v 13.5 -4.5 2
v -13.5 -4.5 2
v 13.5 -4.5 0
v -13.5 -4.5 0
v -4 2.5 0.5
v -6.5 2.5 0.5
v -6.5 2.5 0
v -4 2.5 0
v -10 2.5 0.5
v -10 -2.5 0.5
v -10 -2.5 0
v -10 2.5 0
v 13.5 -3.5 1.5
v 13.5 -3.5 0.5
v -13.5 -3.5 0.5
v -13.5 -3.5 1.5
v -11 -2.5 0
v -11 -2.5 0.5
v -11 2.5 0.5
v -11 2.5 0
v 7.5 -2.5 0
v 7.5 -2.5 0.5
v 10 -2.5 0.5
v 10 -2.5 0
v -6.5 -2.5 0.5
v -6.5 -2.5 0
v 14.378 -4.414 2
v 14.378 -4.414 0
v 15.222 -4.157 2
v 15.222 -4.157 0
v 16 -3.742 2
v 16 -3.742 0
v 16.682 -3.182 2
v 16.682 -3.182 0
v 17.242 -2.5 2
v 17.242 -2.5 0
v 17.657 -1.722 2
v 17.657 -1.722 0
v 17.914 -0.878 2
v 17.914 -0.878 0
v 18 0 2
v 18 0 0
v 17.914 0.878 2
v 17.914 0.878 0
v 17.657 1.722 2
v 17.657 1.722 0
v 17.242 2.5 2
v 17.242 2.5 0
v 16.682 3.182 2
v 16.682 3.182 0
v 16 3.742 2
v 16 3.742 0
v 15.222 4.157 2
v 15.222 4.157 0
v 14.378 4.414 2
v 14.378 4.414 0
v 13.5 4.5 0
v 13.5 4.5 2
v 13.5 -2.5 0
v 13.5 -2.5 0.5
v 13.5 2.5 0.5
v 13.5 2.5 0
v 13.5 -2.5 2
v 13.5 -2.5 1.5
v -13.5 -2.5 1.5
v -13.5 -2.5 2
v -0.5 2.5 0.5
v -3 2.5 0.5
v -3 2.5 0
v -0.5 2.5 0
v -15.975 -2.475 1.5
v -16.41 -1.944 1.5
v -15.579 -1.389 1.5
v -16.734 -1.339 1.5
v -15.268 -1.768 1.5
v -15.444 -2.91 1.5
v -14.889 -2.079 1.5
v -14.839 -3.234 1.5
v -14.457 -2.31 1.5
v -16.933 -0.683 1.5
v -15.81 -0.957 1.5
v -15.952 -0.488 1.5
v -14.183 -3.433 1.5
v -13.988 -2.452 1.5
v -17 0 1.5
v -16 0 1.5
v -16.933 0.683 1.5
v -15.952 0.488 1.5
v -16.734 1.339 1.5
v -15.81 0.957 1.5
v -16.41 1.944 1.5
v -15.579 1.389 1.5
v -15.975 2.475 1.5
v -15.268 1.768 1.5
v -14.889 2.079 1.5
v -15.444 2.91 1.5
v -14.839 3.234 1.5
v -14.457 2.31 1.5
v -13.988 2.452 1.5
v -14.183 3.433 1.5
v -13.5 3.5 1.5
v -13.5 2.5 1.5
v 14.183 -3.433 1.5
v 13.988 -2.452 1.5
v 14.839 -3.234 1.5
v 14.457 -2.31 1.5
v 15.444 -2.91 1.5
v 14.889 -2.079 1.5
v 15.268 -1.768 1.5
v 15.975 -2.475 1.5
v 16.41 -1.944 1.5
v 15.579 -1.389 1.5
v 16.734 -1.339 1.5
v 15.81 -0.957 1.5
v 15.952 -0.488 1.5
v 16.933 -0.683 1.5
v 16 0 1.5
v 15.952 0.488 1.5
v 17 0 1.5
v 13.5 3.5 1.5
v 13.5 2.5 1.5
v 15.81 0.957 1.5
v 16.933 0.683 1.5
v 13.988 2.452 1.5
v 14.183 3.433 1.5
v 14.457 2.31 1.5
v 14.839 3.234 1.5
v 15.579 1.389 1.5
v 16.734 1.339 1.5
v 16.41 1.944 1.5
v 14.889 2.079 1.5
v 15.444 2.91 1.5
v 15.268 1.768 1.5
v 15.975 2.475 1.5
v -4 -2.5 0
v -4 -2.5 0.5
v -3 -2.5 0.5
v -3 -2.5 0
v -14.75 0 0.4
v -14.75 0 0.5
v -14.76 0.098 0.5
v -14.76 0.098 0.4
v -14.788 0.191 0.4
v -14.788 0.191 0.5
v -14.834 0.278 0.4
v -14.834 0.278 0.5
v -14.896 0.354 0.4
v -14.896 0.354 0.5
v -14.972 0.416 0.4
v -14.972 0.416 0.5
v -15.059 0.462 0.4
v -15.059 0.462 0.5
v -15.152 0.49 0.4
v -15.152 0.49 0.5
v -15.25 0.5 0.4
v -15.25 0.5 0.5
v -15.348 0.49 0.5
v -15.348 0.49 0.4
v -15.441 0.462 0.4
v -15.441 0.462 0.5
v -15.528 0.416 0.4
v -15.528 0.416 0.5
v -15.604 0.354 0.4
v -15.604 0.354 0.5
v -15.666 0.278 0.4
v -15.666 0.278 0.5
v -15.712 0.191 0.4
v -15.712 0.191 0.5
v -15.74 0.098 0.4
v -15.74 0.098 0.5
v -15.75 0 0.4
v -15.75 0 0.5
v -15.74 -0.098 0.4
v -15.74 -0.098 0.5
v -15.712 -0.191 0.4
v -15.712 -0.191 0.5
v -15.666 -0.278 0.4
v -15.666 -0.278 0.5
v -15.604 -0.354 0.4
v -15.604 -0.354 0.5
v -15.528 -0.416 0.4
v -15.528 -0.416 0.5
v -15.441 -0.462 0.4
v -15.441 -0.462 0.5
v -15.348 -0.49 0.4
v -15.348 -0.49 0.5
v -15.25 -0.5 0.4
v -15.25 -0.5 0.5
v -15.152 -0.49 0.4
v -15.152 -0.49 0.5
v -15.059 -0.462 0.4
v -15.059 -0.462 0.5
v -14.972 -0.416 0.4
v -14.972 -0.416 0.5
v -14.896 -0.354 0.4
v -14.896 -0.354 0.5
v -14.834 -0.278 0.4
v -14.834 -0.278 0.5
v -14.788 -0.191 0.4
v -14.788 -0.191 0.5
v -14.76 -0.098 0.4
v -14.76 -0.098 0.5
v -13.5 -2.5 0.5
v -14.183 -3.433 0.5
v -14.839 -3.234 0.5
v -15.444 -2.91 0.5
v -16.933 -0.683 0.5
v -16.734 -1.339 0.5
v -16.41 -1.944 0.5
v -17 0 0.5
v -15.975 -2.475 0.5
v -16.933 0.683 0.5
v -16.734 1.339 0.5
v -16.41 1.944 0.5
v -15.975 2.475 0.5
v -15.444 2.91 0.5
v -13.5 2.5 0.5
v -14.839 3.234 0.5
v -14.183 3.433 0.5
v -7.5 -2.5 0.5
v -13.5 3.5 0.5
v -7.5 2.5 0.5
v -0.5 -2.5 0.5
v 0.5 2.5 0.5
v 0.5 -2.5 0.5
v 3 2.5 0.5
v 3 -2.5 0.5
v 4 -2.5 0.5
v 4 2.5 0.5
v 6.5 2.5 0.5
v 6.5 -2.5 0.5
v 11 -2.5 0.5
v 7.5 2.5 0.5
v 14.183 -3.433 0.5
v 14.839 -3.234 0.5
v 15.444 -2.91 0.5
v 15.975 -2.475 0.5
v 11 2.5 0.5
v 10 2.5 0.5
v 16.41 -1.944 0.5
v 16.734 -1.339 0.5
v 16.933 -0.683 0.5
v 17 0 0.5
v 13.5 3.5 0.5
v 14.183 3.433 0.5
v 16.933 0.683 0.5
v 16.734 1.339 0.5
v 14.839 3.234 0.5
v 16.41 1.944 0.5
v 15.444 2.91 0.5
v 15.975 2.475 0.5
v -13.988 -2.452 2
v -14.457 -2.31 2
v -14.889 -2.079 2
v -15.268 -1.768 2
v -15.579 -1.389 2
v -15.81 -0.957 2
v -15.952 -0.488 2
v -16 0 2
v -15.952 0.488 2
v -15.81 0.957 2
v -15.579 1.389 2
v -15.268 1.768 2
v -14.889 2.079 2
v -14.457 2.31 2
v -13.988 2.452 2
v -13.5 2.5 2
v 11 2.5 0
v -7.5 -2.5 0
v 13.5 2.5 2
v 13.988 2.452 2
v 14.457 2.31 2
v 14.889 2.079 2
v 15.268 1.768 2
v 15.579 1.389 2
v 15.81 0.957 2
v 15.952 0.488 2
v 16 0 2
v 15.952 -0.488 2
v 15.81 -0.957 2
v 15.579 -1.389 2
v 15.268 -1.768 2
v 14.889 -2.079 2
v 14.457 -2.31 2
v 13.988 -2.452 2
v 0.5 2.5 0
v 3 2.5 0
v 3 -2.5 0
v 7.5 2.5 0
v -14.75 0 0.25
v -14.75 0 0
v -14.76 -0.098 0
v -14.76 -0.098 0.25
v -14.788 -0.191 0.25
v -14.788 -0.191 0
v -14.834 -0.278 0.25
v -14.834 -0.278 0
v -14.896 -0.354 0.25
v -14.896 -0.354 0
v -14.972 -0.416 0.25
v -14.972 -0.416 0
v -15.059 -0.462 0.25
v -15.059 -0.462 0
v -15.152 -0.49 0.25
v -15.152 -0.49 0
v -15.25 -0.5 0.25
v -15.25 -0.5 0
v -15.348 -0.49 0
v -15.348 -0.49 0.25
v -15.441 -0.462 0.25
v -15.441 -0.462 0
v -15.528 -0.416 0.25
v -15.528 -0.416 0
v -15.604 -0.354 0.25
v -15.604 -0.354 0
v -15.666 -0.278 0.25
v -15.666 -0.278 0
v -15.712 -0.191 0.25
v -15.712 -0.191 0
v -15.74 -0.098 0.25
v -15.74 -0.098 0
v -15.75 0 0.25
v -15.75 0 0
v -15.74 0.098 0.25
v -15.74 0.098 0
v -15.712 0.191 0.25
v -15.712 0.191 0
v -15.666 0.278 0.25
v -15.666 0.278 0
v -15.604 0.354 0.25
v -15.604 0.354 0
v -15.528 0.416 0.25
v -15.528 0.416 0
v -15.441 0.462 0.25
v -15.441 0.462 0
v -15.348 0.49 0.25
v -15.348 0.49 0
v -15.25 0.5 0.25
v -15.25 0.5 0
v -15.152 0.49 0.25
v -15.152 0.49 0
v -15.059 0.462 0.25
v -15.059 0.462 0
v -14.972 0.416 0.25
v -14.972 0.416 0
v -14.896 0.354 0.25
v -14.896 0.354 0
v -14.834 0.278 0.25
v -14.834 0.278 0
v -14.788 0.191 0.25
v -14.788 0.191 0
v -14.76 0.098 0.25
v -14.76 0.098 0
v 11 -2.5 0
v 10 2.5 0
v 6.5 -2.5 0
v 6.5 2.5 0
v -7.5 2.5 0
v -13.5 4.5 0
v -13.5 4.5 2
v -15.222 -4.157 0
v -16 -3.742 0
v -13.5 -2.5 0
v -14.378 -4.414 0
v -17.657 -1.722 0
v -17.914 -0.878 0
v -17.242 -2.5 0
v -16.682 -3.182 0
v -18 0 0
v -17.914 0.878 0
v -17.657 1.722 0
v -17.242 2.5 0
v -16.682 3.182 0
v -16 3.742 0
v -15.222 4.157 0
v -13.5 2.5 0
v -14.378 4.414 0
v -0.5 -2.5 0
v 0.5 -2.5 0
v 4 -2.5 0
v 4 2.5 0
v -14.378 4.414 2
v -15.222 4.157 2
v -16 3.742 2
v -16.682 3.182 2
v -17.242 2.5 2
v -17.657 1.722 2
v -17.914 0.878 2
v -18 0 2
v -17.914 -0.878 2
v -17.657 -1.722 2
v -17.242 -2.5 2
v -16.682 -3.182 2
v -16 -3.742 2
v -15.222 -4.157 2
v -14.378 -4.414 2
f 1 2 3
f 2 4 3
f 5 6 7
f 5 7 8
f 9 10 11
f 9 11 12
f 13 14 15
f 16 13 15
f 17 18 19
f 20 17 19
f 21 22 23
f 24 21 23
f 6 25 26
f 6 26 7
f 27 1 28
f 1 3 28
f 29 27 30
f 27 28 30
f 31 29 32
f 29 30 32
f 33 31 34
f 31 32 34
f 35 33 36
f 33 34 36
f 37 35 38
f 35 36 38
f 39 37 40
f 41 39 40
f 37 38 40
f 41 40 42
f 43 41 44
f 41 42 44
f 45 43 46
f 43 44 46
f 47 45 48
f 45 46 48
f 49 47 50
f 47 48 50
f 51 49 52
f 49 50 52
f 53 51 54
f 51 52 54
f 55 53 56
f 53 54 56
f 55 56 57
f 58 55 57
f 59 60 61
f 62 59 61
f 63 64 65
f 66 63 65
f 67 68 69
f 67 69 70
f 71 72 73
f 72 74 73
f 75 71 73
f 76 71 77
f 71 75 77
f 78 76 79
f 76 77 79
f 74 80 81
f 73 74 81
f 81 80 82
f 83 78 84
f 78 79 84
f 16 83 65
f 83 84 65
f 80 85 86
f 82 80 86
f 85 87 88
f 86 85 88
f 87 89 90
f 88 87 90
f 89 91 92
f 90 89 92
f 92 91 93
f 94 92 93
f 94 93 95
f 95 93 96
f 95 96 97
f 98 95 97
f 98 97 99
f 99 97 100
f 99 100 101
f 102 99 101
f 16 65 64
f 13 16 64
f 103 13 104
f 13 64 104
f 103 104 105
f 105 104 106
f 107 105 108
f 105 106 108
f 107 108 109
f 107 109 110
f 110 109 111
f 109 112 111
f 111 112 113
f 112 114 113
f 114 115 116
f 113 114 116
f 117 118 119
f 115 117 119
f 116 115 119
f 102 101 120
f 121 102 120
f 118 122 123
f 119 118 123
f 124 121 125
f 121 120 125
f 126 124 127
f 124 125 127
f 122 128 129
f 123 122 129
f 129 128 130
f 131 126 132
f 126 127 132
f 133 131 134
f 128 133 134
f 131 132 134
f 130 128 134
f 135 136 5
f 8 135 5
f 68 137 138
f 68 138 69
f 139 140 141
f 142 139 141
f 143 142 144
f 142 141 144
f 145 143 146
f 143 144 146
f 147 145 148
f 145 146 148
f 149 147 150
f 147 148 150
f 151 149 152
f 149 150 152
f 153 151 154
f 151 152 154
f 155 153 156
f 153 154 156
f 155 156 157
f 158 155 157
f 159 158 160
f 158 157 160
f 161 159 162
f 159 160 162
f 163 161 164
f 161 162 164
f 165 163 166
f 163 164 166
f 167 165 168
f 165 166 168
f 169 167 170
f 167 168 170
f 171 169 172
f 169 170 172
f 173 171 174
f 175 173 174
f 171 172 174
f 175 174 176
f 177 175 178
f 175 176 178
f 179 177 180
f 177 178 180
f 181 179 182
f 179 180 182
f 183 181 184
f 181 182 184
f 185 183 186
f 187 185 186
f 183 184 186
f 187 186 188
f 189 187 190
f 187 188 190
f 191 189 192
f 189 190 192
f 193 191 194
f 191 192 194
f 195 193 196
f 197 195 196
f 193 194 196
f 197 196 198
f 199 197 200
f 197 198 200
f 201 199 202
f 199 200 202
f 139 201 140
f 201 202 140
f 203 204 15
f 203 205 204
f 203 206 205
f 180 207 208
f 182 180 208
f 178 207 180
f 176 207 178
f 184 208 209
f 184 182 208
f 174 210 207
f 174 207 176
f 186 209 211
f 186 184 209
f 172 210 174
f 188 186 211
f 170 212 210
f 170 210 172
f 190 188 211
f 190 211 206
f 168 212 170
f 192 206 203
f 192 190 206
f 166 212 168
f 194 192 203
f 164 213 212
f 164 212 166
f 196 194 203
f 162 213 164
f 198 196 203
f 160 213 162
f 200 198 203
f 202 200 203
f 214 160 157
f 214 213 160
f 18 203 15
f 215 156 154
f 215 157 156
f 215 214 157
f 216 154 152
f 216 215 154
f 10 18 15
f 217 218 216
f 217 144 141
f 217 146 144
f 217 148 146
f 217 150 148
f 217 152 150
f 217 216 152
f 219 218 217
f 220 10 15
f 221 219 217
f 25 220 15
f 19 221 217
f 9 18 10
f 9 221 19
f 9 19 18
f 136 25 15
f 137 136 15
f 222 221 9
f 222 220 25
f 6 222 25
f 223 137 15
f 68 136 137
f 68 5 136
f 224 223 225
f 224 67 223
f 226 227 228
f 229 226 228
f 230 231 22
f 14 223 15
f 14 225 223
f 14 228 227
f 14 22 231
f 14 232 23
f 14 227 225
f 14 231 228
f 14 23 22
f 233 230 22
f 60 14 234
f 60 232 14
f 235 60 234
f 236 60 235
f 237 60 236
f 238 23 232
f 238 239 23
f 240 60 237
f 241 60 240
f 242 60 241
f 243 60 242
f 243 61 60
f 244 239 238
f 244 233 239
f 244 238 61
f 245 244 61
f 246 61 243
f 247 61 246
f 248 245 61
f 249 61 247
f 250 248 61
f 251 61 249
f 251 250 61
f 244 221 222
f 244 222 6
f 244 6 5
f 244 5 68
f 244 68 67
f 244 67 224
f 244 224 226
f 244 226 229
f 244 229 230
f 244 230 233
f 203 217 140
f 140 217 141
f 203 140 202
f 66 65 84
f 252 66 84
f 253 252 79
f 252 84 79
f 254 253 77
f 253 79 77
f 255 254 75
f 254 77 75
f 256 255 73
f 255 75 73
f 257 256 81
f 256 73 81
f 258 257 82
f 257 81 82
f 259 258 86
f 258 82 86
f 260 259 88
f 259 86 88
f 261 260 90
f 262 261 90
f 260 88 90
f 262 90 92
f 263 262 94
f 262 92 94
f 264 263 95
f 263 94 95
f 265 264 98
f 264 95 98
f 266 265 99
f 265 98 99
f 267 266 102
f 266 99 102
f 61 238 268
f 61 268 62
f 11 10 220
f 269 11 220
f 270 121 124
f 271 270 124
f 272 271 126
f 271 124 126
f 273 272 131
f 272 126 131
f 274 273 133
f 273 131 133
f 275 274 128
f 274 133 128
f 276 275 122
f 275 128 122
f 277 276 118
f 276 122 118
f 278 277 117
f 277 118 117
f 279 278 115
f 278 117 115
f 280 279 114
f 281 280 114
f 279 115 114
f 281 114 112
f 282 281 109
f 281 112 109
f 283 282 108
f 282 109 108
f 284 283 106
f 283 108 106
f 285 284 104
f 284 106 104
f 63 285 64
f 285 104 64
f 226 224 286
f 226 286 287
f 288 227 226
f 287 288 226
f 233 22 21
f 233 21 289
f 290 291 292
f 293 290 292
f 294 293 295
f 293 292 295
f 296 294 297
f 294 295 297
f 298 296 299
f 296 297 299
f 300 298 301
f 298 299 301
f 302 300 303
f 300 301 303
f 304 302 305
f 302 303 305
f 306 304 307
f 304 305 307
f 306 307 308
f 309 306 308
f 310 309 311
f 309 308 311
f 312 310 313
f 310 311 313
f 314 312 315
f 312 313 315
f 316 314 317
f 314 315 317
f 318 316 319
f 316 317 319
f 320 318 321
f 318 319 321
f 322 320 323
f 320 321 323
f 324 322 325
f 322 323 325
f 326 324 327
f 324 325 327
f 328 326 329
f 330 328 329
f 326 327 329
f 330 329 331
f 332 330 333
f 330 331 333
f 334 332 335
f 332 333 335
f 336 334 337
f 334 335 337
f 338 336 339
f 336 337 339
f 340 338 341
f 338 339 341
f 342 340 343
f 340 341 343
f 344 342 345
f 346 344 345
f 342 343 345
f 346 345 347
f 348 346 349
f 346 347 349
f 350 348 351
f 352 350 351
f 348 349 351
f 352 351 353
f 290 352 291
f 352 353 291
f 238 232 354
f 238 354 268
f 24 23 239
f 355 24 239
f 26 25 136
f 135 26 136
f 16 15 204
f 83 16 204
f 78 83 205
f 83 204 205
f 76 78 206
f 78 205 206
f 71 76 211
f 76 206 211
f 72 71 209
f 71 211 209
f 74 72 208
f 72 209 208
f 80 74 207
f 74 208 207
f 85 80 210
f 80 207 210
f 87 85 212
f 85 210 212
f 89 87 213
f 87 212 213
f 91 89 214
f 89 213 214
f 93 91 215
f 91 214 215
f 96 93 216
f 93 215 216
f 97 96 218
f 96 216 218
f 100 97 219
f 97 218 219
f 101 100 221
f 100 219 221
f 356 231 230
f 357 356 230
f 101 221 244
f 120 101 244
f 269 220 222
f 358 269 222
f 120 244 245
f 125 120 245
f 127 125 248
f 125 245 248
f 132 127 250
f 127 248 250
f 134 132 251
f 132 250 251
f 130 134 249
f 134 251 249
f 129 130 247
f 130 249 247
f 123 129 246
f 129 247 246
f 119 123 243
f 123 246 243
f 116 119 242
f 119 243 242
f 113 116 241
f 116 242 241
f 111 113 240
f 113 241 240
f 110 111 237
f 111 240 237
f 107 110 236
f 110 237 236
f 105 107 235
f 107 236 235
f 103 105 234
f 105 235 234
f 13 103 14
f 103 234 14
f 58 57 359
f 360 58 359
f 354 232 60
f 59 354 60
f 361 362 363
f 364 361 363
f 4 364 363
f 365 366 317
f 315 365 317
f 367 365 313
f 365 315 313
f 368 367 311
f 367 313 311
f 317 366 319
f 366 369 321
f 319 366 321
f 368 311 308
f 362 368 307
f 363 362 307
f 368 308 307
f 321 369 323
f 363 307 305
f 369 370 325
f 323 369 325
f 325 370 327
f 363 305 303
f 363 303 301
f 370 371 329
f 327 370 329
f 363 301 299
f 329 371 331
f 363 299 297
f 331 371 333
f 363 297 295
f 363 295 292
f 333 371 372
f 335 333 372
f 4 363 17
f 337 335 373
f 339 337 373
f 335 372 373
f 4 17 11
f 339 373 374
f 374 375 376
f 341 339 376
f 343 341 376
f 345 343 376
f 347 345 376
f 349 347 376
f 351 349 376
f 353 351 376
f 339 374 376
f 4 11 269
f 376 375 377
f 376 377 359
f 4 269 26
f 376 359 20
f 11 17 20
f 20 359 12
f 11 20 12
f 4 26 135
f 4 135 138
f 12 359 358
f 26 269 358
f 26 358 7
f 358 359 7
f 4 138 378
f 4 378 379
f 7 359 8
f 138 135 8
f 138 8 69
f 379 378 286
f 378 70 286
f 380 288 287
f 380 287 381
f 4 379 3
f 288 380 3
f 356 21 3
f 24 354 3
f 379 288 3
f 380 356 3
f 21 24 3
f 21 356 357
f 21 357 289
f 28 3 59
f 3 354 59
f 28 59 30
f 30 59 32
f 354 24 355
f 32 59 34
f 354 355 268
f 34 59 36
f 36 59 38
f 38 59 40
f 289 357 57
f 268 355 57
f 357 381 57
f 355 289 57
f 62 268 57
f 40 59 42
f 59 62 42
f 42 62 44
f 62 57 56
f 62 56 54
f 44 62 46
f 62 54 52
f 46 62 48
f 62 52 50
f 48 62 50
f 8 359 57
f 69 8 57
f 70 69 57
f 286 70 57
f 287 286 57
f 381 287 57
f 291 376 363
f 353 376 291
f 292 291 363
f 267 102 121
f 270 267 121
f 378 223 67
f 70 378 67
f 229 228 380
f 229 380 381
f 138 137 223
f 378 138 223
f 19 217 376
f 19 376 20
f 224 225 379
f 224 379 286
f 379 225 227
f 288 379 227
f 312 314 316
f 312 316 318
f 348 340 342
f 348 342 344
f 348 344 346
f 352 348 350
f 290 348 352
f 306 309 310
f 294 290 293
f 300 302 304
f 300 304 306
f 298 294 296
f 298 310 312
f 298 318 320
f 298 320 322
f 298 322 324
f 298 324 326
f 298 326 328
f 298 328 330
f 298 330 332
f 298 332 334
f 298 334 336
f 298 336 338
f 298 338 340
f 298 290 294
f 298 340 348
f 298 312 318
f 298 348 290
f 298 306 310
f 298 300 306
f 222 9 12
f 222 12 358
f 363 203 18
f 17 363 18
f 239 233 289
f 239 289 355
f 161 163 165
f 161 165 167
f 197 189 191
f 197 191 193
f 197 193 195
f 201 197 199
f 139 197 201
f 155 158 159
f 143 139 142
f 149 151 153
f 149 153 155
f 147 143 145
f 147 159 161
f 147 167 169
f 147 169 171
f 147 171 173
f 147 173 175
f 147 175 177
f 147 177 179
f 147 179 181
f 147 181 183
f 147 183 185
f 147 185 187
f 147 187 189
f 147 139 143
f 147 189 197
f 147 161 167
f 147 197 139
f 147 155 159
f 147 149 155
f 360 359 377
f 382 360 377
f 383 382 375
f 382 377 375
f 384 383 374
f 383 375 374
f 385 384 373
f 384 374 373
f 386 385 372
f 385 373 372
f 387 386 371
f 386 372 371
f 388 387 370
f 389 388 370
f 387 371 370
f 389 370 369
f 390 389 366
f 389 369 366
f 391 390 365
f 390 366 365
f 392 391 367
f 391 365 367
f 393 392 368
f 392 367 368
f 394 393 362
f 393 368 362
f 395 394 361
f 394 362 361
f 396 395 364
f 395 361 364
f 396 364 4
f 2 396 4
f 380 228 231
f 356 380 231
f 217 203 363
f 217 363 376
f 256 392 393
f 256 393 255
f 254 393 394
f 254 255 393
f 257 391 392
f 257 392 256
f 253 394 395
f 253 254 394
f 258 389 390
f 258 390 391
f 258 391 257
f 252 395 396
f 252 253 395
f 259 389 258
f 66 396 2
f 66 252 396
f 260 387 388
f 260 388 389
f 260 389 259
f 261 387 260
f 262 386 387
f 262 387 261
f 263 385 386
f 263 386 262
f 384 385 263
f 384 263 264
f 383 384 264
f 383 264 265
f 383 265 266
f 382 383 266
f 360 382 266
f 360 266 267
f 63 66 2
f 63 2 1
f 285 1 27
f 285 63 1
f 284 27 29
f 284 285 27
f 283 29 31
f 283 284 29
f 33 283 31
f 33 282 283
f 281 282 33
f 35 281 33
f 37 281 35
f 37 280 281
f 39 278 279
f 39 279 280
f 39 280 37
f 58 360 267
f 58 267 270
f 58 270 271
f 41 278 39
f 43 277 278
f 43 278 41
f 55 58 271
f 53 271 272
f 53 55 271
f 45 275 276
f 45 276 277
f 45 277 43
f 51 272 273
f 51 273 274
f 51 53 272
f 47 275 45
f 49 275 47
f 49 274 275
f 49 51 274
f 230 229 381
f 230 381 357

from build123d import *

# Parameters (mm, degrees)
F1_DEPTH  = 0.5
F2_W      = 2.5
F2_H      = 5
F3_DEPTH  = 0.501
F4_DEPTH  = 1
F6_DEPTH  = 0.5
F8_DEPTH  = 0.1
F10_DEPTH = 0.25


# Not quite as in the source:
# - a feature names something its author has since deleted; it is built from what else it names


with BuildPart() as f1:
    # F0 (on Top) → F1 (new body)
    with BuildSketch(Plane.XY):
        with BuildLine():
            Line((0, 4.5), (-13.5, 4.5))
            ThreePointArc((-13.5, 4.5), (-18, 0), (-13.5, -4.5))
            Line((-13.5, -4.5), (0, -4.5))
            Line((0, -4.5), (13.5, -4.5))
            ThreePointArc((13.5, -4.5), (18, 0), (13.5, 4.5))
            Line((13.5, 4.5), (0, 4.5))
        make_face()
    extrude(amount=F1_DEPTH)

    # F2 (on face) → F3 (cut, through all)
    with BuildSketch(Plane.XY.offset(0.5)):
        with Locations((-12.25, 0)):
            Rectangle(F2_W, F2_H)
        with Locations((-5.25, 0)):
            Rectangle(F2_W, F2_H)
        with Locations((-1.75, 0)):
            Rectangle(F2_W, F2_H)
        with Locations((-8.75, 0)):
            Rectangle(F2_W, F2_H)
        with Locations((1.75, 0)):
            Rectangle(F2_W, F2_H)
        with Locations((5.25, 0)):
            Rectangle(F2_W, F2_H)
        with Locations((8.75, 0)):
            Rectangle(F2_W, F2_H)
        with Locations((12.25, 0)):
            Rectangle(F2_W, F2_H)
    extrude(amount=-F3_DEPTH, mode=Mode.SUBTRACT)

    # F2 (on face) → F4 (join)
    with BuildSketch(Plane.XY.offset(0.5)):
        with BuildLine():
            Line((0, 4.5), (-13.5, 4.5))
            ThreePointArc((-13.5, 4.5), (-18, 0), (-13.5, -4.5))
            Line((-13.5, -4.5), (0, -4.5))
            Line((0, -4.5), (13.5, -4.5))
            ThreePointArc((13.5, -4.5), (18, 0), (13.5, 4.5))
            Line((13.5, 4.5), (0, 4.5))
        make_face()
        with BuildLine():
            ThreePointArc((-13.5, -3.5), (-17, 0), (-13.5, 3.5))
            Line((-13.5, 3.5), (0, 3.5))
            Line((0, 3.5), (13.5, 3.5))
            ThreePointArc((13.5, 3.5), (17, 0), (13.5, -3.5))
            Line((13.5, -3.5), (0, -3.5))
            Line((0, -3.5), (-13.5, -3.5))
        make_face(mode=Mode.SUBTRACT)
    extrude(amount=F4_DEPTH)

    # F5 (on face) → F6 (join)
    with BuildSketch(Plane.XY.offset(1.5)):
        with BuildLine():
            Line((0, 4.5), (-13.5, 4.5))
            ThreePointArc((-13.5, 4.5), (-18, 0), (-13.5, -4.5))
            Line((-13.5, -4.5), (0, -4.5))
            Line((0, -4.5), (13.5, -4.5))
            ThreePointArc((13.5, -4.5), (18, 0), (13.5, 4.5))
            Line((13.5, 4.5), (0, 4.5))
        make_face()
        with BuildLine():
            Line((13.5, -3.5), (-13.5, -3.5))
            ThreePointArc((-13.5, -3.5), (-17, 0), (-13.5, 3.5))
            Line((-13.5, 3.5), (13.5, 3.5))
            ThreePointArc((13.5, 3.5), (17, 0), (13.5, -3.5))
        make_face(mode=Mode.SUBTRACT)
        with BuildLine():
            ThreePointArc((-13.5, 3.5), (-17, 0), (-13.5, -3.5))
            Line((-13.5, -3.5), (13.5, -3.5))
            ThreePointArc((13.5, -3.5), (17, 0), (13.5, 3.5))
            Line((13.5, 3.5), (-13.5, 3.5))
        make_face()
        with BuildLine():
            ThreePointArc((-13.5, -2.5), (-16, 0), (-13.5, 2.5))
            Line((-13.5, 2.5), (0, 2.5))
            Line((0, 2.5), (13.5, 2.5))
            ThreePointArc((13.5, 2.5), (16, 0), (13.5, -2.5))
            Line((13.5, -2.5), (0, -2.5))
            Line((0, -2.5), (-13.5, -2.5))
        make_face(mode=Mode.SUBTRACT)
    extrude(amount=F6_DEPTH)

    # F7 (on face) → F8 (cut)
    with BuildSketch(Plane.XY.offset(0.5)):
        with BuildLine():
            ThreePointArc((-15.75, 0), (-15.25, -0.5), (-14.75, 0))
            ThreePointArc((-14.75, 0), (-15.25, 0.5), (-15.75, 0))
        make_face()
    extrude(amount=-F8_DEPTH, mode=Mode.SUBTRACT)

    # F9 (on face) → F10 (cut)
    with BuildSketch(Plane(origin=(0, 0, 0), x_dir=(1, 0, 0), z_dir=(0, 0, -1))):
        with BuildLine():
            ThreePointArc((-15.75, 0), (-15.25, -0.5), (-14.75, 0))
            ThreePointArc((-14.75, 0), (-15.25, 0.5), (-15.75, 0))
        make_face()
    extrude(amount=-F10_DEPTH, mode=Mode.SUBTRACT)


solid = f1.part
